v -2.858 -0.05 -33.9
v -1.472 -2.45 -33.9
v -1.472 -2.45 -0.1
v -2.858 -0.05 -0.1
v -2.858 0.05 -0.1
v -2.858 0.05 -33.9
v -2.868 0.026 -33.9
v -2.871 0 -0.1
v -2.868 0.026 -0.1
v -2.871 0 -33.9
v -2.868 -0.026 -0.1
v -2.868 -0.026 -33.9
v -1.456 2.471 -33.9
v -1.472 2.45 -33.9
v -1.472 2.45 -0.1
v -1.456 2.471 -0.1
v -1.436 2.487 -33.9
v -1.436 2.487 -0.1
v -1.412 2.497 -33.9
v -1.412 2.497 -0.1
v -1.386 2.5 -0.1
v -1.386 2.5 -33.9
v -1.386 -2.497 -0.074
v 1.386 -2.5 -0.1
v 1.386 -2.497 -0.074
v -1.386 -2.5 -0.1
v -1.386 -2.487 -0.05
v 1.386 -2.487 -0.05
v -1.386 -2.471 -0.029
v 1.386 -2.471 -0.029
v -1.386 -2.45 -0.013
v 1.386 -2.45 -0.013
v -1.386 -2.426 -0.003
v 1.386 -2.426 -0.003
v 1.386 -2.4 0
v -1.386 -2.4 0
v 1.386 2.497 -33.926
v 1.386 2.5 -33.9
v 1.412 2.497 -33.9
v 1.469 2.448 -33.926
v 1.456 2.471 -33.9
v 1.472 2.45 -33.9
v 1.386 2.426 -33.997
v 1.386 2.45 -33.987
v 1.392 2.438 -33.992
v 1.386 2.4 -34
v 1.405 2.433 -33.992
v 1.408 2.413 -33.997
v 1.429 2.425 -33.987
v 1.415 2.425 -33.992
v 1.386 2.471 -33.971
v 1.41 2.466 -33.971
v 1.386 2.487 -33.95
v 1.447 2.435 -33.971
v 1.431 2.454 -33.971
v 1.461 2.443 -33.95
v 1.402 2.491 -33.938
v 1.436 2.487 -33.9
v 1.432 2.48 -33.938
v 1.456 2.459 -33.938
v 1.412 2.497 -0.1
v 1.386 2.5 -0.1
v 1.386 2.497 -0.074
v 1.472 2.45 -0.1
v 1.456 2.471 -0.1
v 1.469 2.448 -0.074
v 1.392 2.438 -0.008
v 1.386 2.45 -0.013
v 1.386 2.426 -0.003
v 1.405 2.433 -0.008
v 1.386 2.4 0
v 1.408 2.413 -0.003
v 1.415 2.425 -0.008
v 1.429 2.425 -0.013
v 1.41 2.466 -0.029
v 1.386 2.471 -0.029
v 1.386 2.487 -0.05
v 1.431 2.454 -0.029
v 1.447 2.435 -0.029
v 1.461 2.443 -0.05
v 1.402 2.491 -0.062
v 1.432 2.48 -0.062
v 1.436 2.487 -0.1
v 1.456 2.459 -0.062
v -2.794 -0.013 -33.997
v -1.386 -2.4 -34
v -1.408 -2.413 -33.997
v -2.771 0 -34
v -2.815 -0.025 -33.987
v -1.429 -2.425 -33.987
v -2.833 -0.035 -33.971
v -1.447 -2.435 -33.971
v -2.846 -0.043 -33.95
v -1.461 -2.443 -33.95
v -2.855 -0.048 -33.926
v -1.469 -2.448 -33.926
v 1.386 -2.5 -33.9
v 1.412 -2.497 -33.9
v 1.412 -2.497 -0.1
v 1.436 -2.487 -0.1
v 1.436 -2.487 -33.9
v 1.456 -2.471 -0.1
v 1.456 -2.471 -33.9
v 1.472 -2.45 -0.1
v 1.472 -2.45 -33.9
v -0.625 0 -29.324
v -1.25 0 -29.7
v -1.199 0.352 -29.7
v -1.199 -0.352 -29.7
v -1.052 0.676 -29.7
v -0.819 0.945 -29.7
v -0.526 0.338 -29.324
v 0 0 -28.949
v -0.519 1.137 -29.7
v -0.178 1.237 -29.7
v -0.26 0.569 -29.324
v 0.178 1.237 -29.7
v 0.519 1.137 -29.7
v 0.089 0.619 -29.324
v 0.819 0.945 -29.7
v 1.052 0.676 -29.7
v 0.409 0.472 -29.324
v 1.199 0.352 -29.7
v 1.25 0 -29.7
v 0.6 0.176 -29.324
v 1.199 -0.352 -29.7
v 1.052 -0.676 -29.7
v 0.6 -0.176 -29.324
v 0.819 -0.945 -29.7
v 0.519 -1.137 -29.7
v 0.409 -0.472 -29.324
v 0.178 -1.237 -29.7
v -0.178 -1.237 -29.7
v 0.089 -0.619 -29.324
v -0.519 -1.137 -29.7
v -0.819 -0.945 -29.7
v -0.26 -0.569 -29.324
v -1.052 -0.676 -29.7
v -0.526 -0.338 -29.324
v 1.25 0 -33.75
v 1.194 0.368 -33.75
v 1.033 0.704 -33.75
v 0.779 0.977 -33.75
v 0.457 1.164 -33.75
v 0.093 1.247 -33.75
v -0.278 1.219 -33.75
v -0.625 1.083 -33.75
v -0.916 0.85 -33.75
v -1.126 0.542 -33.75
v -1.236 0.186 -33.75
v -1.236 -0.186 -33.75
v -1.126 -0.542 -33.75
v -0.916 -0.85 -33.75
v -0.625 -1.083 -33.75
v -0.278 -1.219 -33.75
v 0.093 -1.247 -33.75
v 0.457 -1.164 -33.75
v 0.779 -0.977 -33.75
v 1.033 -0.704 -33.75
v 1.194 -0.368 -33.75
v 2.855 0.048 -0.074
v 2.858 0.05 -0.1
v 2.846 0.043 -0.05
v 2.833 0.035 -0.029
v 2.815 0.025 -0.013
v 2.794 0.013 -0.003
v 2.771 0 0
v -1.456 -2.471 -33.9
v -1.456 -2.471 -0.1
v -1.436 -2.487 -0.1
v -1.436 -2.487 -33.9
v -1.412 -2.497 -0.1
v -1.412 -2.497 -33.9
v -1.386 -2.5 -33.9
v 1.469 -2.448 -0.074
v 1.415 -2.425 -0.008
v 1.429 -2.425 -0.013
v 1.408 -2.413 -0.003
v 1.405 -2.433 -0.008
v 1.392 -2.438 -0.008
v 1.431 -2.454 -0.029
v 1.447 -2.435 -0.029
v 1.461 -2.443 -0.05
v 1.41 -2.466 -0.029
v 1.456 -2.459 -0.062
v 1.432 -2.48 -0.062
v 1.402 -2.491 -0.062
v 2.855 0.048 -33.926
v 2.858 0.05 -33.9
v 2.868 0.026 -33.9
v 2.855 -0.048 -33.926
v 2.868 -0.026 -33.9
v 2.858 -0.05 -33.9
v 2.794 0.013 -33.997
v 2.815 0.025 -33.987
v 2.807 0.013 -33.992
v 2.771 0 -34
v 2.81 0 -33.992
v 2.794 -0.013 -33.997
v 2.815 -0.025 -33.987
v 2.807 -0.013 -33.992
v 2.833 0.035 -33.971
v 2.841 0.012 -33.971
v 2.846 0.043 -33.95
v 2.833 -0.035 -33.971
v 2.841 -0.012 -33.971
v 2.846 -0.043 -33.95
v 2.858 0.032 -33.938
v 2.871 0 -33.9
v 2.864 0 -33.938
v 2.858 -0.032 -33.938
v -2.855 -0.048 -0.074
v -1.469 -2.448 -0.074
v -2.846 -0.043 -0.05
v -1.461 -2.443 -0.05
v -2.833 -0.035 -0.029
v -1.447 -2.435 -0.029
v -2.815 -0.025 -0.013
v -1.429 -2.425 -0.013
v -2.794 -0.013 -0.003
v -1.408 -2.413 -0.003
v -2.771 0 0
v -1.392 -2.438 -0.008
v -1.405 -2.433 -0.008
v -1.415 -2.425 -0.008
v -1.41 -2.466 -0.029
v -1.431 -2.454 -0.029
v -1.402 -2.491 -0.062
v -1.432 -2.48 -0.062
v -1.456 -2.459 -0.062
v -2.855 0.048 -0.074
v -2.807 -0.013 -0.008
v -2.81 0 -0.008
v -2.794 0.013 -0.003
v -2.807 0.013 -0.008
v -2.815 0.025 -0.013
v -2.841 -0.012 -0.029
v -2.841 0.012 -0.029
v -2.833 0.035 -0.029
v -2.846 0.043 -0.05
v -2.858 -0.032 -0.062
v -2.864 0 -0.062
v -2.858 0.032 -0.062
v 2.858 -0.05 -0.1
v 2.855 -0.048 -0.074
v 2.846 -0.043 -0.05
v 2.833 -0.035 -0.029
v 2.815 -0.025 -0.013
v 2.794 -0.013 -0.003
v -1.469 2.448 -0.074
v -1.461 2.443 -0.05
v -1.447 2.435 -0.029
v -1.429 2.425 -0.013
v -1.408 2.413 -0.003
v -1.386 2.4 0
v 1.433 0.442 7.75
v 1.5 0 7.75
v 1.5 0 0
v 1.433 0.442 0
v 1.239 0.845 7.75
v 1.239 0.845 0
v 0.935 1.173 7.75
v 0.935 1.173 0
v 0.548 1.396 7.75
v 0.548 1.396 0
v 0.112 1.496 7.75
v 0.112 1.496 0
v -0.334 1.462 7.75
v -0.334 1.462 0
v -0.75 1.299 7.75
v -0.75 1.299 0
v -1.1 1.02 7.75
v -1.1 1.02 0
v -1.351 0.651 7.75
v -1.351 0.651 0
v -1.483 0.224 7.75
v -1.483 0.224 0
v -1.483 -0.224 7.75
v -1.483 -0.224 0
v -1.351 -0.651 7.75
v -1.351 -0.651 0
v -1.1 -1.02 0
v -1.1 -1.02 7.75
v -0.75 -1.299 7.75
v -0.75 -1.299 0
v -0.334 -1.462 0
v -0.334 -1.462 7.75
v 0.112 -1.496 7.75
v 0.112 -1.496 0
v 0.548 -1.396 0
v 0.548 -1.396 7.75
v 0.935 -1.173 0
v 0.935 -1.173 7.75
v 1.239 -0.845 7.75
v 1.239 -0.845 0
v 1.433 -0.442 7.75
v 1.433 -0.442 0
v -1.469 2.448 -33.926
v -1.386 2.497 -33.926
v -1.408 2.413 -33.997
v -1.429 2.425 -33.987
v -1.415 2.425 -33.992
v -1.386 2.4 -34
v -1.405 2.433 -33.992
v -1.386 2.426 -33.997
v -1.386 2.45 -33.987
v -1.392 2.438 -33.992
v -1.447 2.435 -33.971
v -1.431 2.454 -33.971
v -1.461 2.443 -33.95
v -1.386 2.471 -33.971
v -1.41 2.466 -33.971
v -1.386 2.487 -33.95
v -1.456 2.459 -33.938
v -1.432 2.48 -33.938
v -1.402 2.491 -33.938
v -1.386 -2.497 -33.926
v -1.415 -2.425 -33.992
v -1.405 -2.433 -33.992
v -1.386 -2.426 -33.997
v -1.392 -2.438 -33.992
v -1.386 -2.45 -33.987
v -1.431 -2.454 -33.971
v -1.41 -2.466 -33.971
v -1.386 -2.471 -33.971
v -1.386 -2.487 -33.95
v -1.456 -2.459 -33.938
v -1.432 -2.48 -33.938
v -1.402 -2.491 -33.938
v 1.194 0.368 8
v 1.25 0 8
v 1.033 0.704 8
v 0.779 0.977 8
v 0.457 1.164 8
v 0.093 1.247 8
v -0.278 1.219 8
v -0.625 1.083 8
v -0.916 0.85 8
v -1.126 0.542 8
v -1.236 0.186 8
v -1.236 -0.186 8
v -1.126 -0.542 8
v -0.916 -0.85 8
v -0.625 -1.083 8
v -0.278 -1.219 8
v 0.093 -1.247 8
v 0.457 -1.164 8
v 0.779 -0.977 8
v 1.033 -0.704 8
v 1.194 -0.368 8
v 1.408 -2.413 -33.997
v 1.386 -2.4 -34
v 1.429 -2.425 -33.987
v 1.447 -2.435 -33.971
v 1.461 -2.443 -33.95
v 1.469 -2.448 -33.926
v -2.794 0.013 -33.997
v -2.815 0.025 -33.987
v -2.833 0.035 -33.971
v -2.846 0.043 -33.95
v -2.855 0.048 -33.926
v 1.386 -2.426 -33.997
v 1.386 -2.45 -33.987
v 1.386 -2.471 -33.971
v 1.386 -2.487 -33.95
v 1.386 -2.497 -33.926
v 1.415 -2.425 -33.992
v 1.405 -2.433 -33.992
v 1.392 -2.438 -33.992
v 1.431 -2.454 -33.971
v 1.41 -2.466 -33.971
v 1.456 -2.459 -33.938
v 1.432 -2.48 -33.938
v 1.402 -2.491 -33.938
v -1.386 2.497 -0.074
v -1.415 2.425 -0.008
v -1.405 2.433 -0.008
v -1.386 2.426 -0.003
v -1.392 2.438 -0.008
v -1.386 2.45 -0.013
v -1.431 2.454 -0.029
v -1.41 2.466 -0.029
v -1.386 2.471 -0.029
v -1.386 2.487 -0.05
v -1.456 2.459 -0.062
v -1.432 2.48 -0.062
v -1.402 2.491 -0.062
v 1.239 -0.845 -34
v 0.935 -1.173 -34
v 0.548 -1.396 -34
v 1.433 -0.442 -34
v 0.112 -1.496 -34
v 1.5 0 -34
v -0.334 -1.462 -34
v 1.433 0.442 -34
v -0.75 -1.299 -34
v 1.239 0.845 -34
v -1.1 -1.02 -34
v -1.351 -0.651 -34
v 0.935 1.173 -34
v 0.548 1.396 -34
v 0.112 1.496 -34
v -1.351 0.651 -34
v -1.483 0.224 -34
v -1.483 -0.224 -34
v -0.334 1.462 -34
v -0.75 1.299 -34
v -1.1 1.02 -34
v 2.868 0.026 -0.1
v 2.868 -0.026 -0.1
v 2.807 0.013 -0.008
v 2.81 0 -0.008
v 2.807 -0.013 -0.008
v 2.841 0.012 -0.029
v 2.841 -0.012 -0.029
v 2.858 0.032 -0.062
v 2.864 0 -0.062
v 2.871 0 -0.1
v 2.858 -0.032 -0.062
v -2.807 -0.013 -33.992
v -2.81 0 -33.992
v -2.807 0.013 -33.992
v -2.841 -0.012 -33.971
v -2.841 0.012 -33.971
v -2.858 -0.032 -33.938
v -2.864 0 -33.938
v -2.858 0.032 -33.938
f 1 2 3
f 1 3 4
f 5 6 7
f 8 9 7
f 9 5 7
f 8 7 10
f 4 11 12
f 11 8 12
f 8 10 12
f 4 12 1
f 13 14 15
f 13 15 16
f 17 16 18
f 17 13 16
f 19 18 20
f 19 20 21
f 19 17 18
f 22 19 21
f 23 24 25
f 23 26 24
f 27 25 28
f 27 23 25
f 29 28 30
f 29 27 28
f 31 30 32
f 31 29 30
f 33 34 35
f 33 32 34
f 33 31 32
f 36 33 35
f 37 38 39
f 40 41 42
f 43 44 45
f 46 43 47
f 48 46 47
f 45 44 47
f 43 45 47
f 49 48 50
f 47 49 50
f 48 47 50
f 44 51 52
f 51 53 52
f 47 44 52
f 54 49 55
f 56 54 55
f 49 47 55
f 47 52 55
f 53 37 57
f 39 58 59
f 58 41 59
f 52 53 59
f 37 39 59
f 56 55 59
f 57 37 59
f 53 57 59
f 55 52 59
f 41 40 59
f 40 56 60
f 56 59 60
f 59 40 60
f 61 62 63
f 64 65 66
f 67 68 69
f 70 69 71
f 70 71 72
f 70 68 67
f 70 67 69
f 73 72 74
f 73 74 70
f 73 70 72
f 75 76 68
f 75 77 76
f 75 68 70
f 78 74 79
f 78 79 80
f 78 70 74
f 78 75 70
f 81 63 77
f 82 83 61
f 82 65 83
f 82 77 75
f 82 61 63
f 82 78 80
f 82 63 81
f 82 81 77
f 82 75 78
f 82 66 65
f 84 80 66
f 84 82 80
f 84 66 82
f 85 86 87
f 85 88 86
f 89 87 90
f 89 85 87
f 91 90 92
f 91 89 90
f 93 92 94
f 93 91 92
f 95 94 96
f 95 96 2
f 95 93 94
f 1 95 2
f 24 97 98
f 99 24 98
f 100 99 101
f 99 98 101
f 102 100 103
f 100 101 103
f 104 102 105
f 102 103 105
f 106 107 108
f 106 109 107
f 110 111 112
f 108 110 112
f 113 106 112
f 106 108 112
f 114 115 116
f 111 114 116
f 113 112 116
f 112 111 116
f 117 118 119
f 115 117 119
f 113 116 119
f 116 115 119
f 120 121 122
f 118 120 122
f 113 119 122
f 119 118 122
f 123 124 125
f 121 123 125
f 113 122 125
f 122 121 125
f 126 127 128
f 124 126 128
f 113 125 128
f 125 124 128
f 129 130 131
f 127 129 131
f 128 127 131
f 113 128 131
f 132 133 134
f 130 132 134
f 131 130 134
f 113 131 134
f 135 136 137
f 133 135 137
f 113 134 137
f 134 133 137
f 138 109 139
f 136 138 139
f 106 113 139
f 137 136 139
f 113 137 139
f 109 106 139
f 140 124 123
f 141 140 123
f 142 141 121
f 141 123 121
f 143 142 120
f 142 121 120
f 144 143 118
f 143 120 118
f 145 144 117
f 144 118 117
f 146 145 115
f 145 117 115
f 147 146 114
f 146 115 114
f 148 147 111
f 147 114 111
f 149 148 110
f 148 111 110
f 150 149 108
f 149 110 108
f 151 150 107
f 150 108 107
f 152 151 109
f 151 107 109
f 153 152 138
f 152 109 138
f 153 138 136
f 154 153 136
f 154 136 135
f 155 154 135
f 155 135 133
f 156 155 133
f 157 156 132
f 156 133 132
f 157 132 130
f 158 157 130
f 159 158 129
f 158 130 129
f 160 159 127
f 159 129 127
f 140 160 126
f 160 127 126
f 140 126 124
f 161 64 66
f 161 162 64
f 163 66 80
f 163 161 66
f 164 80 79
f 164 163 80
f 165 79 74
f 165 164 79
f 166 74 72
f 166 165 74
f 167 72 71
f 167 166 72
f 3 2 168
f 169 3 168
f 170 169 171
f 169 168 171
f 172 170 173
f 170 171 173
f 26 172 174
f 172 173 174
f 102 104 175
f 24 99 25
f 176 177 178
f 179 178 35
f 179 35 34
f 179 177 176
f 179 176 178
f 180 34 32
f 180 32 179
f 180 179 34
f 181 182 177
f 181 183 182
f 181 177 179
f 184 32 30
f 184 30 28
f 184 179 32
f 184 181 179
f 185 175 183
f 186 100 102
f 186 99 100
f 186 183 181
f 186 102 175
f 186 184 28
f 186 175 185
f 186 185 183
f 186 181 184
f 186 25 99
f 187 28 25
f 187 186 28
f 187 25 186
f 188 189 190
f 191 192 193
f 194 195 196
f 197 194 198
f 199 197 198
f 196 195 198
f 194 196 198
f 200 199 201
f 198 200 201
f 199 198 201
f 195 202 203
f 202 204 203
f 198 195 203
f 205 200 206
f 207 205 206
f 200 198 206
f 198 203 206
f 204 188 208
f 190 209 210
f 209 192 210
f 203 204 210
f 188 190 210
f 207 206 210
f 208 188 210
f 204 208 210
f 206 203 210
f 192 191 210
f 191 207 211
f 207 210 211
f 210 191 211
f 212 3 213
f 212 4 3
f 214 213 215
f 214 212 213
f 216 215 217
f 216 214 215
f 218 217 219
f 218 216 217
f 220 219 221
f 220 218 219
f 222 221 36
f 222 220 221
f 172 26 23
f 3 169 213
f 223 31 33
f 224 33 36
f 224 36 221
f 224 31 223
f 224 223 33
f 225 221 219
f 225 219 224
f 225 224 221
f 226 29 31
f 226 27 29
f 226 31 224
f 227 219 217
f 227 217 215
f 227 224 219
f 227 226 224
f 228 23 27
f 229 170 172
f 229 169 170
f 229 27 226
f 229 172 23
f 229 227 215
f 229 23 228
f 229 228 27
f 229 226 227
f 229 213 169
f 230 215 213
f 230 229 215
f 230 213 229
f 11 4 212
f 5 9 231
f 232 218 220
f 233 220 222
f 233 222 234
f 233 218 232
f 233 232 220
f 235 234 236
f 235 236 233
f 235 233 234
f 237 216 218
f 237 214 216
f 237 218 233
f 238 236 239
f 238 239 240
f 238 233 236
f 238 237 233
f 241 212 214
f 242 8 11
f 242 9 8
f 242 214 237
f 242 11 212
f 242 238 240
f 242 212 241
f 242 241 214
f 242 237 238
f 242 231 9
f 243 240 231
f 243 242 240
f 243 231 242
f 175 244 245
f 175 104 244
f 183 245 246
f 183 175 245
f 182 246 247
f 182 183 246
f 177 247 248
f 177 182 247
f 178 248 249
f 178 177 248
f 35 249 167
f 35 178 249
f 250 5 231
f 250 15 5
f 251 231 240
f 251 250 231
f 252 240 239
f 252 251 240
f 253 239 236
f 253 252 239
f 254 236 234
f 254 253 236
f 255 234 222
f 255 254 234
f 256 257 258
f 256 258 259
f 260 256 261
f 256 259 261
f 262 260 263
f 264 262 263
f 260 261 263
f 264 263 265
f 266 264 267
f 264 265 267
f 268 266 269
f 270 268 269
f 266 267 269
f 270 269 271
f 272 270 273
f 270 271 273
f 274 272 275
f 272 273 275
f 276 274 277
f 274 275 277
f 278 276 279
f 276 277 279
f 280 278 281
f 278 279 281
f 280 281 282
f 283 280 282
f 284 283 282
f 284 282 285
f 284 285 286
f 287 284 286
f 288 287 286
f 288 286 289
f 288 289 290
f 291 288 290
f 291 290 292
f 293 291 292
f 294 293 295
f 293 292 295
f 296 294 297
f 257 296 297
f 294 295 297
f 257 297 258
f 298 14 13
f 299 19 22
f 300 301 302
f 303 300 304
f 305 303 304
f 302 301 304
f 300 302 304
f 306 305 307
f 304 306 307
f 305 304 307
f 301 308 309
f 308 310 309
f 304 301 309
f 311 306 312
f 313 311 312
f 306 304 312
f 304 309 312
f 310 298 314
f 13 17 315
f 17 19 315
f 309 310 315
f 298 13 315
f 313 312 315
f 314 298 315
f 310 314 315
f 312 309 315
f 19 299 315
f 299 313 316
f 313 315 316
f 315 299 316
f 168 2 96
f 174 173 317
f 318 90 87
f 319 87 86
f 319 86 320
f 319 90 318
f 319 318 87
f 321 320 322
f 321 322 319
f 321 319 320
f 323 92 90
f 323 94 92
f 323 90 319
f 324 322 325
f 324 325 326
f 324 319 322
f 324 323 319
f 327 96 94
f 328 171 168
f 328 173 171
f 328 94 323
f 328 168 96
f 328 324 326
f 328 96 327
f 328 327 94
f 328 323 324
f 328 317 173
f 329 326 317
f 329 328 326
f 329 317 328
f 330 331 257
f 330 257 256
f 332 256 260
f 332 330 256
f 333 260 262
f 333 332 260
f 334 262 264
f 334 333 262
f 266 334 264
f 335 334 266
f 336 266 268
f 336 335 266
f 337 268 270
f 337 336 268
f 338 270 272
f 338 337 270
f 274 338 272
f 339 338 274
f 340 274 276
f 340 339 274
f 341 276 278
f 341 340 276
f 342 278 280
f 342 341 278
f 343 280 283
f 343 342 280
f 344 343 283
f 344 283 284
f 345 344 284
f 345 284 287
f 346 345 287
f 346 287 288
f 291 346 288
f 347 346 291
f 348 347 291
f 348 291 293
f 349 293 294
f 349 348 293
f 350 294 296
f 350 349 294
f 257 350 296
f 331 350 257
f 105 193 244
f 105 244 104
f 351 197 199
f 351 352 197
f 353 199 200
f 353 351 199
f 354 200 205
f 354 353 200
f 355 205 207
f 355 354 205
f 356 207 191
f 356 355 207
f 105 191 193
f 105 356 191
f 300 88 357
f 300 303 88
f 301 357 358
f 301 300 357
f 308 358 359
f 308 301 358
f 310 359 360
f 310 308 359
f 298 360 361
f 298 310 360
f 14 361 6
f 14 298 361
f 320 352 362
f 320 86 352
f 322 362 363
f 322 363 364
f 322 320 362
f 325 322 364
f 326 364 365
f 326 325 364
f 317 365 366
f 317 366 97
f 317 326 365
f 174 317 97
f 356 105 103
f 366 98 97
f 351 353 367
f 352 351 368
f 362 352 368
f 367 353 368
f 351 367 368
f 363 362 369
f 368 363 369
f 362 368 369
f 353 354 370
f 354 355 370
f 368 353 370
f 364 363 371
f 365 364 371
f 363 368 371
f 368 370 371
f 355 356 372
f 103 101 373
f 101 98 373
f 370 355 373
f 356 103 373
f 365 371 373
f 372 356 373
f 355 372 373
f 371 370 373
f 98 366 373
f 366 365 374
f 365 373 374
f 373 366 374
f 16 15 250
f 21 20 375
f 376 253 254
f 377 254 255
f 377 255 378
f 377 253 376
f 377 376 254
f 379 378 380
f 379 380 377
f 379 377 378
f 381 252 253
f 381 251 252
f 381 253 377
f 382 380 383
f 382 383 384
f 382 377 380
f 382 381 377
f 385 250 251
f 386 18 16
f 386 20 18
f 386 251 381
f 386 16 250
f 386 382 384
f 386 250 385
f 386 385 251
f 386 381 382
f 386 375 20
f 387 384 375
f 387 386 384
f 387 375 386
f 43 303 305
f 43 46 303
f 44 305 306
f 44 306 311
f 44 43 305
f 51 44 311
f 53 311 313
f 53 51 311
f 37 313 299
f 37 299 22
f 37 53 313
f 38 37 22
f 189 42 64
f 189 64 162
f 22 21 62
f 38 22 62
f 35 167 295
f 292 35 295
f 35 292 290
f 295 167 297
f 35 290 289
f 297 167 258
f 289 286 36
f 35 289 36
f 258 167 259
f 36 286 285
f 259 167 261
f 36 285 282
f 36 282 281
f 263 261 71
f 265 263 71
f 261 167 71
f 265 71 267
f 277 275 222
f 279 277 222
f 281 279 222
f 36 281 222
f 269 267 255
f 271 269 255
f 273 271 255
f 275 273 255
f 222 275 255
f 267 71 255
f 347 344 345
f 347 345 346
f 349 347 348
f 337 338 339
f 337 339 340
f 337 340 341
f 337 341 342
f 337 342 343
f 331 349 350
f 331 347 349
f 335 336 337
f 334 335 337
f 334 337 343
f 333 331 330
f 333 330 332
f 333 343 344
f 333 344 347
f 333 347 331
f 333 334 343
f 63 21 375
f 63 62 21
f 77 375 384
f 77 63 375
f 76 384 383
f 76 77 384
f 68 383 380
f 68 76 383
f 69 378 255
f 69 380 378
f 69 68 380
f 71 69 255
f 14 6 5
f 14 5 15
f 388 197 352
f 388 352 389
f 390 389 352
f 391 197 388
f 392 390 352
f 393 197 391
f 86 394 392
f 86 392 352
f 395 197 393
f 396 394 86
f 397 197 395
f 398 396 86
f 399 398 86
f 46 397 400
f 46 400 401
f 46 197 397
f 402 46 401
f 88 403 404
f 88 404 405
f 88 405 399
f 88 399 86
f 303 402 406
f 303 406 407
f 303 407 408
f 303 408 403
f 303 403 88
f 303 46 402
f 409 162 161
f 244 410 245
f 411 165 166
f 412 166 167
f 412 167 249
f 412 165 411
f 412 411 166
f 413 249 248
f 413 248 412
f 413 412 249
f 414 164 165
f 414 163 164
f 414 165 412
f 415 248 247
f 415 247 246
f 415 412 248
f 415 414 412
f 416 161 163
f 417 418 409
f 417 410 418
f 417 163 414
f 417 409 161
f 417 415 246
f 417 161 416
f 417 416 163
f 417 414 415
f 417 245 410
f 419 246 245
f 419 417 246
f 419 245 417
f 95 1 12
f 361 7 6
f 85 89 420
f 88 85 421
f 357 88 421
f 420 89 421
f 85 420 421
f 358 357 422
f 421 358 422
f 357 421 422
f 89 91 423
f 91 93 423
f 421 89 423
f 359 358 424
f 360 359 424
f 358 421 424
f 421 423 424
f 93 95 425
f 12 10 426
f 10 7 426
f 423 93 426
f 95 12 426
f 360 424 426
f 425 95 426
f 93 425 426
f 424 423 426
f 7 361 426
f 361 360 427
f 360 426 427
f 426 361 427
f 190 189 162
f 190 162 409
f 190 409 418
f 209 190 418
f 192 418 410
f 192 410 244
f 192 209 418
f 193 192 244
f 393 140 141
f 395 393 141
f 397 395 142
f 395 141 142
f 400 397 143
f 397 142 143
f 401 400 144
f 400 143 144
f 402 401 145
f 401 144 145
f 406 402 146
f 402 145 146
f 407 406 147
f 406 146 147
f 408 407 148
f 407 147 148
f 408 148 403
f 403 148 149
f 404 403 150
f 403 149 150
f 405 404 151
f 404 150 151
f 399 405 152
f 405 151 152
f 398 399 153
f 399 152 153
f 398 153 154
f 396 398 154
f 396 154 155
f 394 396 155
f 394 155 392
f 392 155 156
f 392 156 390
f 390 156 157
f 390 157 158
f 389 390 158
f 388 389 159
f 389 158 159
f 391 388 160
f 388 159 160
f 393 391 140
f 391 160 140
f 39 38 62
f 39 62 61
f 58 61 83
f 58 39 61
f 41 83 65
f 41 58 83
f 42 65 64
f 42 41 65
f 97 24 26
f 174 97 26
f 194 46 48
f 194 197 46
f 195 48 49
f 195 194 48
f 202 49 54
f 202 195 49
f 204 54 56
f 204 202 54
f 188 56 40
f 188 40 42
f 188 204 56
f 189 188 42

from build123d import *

# Parameters (mm, degrees)
SKETCH_1_R      = 1.5
EXTRUDE_1_DEPTH = 8
EXTRUDE_3_DEPTH = 34
M3X0_51_D       = 2.5
M3X0_51_DEPTH   = 4.3
M3X0_51_TIP     = 0.751075774
CHAMFER_1_SIZE  = 0.25
FILLET_1_R      = 0.1


with BuildPart() as part:
    # Эскиз1 → Бобышка-Вытянуть1 (new body)
    with BuildSketch(Plane.XY):
        Circle(SKETCH_1_R)
    extrude(amount=EXTRUDE_1_DEPTH)

    # Эскиз3 → Бобышка-Вытянуть3 (add)
    with BuildSketch(Plane(origin=(0, 0, 0), x_dir=(-1, 0, 0), z_dir=(0, 0, -1))):
        Polygon((2.886751346, 0), (1.443375673, 2.5), (-1.443375673, 2.5), (-2.886751346, 0), (-1.443375673, -2.5), (1.443375673, -2.5), align=None)
    extrude(amount=EXTRUDE_3_DEPTH)

    # Сверление под метчик M3x0.51
    with Locations(Plane(origin=(0, 0, -34), x_dir=(-1, 0, 0), z_dir=(0, 0, -1))):
        with Locations((0, 0)):
            Hole(M3X0_51_D / 2, depth=M3X0_51_DEPTH)
            with Locations((0, 0, -(M3X0_51_DEPTH + M3X0_51_TIP / 2))):  # 118° drill point
                Cone(0, M3X0_51_D / 2, M3X0_51_TIP, mode=Mode.SUBTRACT)

    # Фаска1
    chamfer_1_edges = [part.edges().sort_by_distance(p)[0] for p in [
        (-1.25, 0, -34),
        (-1.5, 0, 8),
    ]]
    chamfer(chamfer_1_edges, length=CHAMFER_1_SIZE)

    # Скругление1
    fillet_1_edges = [part.edges().sort_by_distance(p)[0] for p in [
        (-2.165063509, -1.25, 0),
        (-1.443375673, -2.5, -17),
        (-2.165063509, 1.25, 0),
        (-2.886751346, 0, -17),
        (0, 2.5, 0),
        (-1.443375673, 2.5, -17),
        (2.165063509, 1.25, 0),
        (1.443375673, 2.5, -17),
        (2.165063509, -1.25, 0),
        (2.886751346, 0, -17),
        (0, -2.5, 0),
        (1.443375673, -2.5, -17),
        (-2.165063509, -1.25, -34),
        (-2.165063509, 1.25, -34),
        (0, 2.5, -34),
        (2.165063509, 1.25, -34),
        (2.165063509, -1.25, -34),
        (0, -2.5, -34),
    ]]
    fillet(fillet_1_edges, radius=FILLET_1_R)


solid = part.part
